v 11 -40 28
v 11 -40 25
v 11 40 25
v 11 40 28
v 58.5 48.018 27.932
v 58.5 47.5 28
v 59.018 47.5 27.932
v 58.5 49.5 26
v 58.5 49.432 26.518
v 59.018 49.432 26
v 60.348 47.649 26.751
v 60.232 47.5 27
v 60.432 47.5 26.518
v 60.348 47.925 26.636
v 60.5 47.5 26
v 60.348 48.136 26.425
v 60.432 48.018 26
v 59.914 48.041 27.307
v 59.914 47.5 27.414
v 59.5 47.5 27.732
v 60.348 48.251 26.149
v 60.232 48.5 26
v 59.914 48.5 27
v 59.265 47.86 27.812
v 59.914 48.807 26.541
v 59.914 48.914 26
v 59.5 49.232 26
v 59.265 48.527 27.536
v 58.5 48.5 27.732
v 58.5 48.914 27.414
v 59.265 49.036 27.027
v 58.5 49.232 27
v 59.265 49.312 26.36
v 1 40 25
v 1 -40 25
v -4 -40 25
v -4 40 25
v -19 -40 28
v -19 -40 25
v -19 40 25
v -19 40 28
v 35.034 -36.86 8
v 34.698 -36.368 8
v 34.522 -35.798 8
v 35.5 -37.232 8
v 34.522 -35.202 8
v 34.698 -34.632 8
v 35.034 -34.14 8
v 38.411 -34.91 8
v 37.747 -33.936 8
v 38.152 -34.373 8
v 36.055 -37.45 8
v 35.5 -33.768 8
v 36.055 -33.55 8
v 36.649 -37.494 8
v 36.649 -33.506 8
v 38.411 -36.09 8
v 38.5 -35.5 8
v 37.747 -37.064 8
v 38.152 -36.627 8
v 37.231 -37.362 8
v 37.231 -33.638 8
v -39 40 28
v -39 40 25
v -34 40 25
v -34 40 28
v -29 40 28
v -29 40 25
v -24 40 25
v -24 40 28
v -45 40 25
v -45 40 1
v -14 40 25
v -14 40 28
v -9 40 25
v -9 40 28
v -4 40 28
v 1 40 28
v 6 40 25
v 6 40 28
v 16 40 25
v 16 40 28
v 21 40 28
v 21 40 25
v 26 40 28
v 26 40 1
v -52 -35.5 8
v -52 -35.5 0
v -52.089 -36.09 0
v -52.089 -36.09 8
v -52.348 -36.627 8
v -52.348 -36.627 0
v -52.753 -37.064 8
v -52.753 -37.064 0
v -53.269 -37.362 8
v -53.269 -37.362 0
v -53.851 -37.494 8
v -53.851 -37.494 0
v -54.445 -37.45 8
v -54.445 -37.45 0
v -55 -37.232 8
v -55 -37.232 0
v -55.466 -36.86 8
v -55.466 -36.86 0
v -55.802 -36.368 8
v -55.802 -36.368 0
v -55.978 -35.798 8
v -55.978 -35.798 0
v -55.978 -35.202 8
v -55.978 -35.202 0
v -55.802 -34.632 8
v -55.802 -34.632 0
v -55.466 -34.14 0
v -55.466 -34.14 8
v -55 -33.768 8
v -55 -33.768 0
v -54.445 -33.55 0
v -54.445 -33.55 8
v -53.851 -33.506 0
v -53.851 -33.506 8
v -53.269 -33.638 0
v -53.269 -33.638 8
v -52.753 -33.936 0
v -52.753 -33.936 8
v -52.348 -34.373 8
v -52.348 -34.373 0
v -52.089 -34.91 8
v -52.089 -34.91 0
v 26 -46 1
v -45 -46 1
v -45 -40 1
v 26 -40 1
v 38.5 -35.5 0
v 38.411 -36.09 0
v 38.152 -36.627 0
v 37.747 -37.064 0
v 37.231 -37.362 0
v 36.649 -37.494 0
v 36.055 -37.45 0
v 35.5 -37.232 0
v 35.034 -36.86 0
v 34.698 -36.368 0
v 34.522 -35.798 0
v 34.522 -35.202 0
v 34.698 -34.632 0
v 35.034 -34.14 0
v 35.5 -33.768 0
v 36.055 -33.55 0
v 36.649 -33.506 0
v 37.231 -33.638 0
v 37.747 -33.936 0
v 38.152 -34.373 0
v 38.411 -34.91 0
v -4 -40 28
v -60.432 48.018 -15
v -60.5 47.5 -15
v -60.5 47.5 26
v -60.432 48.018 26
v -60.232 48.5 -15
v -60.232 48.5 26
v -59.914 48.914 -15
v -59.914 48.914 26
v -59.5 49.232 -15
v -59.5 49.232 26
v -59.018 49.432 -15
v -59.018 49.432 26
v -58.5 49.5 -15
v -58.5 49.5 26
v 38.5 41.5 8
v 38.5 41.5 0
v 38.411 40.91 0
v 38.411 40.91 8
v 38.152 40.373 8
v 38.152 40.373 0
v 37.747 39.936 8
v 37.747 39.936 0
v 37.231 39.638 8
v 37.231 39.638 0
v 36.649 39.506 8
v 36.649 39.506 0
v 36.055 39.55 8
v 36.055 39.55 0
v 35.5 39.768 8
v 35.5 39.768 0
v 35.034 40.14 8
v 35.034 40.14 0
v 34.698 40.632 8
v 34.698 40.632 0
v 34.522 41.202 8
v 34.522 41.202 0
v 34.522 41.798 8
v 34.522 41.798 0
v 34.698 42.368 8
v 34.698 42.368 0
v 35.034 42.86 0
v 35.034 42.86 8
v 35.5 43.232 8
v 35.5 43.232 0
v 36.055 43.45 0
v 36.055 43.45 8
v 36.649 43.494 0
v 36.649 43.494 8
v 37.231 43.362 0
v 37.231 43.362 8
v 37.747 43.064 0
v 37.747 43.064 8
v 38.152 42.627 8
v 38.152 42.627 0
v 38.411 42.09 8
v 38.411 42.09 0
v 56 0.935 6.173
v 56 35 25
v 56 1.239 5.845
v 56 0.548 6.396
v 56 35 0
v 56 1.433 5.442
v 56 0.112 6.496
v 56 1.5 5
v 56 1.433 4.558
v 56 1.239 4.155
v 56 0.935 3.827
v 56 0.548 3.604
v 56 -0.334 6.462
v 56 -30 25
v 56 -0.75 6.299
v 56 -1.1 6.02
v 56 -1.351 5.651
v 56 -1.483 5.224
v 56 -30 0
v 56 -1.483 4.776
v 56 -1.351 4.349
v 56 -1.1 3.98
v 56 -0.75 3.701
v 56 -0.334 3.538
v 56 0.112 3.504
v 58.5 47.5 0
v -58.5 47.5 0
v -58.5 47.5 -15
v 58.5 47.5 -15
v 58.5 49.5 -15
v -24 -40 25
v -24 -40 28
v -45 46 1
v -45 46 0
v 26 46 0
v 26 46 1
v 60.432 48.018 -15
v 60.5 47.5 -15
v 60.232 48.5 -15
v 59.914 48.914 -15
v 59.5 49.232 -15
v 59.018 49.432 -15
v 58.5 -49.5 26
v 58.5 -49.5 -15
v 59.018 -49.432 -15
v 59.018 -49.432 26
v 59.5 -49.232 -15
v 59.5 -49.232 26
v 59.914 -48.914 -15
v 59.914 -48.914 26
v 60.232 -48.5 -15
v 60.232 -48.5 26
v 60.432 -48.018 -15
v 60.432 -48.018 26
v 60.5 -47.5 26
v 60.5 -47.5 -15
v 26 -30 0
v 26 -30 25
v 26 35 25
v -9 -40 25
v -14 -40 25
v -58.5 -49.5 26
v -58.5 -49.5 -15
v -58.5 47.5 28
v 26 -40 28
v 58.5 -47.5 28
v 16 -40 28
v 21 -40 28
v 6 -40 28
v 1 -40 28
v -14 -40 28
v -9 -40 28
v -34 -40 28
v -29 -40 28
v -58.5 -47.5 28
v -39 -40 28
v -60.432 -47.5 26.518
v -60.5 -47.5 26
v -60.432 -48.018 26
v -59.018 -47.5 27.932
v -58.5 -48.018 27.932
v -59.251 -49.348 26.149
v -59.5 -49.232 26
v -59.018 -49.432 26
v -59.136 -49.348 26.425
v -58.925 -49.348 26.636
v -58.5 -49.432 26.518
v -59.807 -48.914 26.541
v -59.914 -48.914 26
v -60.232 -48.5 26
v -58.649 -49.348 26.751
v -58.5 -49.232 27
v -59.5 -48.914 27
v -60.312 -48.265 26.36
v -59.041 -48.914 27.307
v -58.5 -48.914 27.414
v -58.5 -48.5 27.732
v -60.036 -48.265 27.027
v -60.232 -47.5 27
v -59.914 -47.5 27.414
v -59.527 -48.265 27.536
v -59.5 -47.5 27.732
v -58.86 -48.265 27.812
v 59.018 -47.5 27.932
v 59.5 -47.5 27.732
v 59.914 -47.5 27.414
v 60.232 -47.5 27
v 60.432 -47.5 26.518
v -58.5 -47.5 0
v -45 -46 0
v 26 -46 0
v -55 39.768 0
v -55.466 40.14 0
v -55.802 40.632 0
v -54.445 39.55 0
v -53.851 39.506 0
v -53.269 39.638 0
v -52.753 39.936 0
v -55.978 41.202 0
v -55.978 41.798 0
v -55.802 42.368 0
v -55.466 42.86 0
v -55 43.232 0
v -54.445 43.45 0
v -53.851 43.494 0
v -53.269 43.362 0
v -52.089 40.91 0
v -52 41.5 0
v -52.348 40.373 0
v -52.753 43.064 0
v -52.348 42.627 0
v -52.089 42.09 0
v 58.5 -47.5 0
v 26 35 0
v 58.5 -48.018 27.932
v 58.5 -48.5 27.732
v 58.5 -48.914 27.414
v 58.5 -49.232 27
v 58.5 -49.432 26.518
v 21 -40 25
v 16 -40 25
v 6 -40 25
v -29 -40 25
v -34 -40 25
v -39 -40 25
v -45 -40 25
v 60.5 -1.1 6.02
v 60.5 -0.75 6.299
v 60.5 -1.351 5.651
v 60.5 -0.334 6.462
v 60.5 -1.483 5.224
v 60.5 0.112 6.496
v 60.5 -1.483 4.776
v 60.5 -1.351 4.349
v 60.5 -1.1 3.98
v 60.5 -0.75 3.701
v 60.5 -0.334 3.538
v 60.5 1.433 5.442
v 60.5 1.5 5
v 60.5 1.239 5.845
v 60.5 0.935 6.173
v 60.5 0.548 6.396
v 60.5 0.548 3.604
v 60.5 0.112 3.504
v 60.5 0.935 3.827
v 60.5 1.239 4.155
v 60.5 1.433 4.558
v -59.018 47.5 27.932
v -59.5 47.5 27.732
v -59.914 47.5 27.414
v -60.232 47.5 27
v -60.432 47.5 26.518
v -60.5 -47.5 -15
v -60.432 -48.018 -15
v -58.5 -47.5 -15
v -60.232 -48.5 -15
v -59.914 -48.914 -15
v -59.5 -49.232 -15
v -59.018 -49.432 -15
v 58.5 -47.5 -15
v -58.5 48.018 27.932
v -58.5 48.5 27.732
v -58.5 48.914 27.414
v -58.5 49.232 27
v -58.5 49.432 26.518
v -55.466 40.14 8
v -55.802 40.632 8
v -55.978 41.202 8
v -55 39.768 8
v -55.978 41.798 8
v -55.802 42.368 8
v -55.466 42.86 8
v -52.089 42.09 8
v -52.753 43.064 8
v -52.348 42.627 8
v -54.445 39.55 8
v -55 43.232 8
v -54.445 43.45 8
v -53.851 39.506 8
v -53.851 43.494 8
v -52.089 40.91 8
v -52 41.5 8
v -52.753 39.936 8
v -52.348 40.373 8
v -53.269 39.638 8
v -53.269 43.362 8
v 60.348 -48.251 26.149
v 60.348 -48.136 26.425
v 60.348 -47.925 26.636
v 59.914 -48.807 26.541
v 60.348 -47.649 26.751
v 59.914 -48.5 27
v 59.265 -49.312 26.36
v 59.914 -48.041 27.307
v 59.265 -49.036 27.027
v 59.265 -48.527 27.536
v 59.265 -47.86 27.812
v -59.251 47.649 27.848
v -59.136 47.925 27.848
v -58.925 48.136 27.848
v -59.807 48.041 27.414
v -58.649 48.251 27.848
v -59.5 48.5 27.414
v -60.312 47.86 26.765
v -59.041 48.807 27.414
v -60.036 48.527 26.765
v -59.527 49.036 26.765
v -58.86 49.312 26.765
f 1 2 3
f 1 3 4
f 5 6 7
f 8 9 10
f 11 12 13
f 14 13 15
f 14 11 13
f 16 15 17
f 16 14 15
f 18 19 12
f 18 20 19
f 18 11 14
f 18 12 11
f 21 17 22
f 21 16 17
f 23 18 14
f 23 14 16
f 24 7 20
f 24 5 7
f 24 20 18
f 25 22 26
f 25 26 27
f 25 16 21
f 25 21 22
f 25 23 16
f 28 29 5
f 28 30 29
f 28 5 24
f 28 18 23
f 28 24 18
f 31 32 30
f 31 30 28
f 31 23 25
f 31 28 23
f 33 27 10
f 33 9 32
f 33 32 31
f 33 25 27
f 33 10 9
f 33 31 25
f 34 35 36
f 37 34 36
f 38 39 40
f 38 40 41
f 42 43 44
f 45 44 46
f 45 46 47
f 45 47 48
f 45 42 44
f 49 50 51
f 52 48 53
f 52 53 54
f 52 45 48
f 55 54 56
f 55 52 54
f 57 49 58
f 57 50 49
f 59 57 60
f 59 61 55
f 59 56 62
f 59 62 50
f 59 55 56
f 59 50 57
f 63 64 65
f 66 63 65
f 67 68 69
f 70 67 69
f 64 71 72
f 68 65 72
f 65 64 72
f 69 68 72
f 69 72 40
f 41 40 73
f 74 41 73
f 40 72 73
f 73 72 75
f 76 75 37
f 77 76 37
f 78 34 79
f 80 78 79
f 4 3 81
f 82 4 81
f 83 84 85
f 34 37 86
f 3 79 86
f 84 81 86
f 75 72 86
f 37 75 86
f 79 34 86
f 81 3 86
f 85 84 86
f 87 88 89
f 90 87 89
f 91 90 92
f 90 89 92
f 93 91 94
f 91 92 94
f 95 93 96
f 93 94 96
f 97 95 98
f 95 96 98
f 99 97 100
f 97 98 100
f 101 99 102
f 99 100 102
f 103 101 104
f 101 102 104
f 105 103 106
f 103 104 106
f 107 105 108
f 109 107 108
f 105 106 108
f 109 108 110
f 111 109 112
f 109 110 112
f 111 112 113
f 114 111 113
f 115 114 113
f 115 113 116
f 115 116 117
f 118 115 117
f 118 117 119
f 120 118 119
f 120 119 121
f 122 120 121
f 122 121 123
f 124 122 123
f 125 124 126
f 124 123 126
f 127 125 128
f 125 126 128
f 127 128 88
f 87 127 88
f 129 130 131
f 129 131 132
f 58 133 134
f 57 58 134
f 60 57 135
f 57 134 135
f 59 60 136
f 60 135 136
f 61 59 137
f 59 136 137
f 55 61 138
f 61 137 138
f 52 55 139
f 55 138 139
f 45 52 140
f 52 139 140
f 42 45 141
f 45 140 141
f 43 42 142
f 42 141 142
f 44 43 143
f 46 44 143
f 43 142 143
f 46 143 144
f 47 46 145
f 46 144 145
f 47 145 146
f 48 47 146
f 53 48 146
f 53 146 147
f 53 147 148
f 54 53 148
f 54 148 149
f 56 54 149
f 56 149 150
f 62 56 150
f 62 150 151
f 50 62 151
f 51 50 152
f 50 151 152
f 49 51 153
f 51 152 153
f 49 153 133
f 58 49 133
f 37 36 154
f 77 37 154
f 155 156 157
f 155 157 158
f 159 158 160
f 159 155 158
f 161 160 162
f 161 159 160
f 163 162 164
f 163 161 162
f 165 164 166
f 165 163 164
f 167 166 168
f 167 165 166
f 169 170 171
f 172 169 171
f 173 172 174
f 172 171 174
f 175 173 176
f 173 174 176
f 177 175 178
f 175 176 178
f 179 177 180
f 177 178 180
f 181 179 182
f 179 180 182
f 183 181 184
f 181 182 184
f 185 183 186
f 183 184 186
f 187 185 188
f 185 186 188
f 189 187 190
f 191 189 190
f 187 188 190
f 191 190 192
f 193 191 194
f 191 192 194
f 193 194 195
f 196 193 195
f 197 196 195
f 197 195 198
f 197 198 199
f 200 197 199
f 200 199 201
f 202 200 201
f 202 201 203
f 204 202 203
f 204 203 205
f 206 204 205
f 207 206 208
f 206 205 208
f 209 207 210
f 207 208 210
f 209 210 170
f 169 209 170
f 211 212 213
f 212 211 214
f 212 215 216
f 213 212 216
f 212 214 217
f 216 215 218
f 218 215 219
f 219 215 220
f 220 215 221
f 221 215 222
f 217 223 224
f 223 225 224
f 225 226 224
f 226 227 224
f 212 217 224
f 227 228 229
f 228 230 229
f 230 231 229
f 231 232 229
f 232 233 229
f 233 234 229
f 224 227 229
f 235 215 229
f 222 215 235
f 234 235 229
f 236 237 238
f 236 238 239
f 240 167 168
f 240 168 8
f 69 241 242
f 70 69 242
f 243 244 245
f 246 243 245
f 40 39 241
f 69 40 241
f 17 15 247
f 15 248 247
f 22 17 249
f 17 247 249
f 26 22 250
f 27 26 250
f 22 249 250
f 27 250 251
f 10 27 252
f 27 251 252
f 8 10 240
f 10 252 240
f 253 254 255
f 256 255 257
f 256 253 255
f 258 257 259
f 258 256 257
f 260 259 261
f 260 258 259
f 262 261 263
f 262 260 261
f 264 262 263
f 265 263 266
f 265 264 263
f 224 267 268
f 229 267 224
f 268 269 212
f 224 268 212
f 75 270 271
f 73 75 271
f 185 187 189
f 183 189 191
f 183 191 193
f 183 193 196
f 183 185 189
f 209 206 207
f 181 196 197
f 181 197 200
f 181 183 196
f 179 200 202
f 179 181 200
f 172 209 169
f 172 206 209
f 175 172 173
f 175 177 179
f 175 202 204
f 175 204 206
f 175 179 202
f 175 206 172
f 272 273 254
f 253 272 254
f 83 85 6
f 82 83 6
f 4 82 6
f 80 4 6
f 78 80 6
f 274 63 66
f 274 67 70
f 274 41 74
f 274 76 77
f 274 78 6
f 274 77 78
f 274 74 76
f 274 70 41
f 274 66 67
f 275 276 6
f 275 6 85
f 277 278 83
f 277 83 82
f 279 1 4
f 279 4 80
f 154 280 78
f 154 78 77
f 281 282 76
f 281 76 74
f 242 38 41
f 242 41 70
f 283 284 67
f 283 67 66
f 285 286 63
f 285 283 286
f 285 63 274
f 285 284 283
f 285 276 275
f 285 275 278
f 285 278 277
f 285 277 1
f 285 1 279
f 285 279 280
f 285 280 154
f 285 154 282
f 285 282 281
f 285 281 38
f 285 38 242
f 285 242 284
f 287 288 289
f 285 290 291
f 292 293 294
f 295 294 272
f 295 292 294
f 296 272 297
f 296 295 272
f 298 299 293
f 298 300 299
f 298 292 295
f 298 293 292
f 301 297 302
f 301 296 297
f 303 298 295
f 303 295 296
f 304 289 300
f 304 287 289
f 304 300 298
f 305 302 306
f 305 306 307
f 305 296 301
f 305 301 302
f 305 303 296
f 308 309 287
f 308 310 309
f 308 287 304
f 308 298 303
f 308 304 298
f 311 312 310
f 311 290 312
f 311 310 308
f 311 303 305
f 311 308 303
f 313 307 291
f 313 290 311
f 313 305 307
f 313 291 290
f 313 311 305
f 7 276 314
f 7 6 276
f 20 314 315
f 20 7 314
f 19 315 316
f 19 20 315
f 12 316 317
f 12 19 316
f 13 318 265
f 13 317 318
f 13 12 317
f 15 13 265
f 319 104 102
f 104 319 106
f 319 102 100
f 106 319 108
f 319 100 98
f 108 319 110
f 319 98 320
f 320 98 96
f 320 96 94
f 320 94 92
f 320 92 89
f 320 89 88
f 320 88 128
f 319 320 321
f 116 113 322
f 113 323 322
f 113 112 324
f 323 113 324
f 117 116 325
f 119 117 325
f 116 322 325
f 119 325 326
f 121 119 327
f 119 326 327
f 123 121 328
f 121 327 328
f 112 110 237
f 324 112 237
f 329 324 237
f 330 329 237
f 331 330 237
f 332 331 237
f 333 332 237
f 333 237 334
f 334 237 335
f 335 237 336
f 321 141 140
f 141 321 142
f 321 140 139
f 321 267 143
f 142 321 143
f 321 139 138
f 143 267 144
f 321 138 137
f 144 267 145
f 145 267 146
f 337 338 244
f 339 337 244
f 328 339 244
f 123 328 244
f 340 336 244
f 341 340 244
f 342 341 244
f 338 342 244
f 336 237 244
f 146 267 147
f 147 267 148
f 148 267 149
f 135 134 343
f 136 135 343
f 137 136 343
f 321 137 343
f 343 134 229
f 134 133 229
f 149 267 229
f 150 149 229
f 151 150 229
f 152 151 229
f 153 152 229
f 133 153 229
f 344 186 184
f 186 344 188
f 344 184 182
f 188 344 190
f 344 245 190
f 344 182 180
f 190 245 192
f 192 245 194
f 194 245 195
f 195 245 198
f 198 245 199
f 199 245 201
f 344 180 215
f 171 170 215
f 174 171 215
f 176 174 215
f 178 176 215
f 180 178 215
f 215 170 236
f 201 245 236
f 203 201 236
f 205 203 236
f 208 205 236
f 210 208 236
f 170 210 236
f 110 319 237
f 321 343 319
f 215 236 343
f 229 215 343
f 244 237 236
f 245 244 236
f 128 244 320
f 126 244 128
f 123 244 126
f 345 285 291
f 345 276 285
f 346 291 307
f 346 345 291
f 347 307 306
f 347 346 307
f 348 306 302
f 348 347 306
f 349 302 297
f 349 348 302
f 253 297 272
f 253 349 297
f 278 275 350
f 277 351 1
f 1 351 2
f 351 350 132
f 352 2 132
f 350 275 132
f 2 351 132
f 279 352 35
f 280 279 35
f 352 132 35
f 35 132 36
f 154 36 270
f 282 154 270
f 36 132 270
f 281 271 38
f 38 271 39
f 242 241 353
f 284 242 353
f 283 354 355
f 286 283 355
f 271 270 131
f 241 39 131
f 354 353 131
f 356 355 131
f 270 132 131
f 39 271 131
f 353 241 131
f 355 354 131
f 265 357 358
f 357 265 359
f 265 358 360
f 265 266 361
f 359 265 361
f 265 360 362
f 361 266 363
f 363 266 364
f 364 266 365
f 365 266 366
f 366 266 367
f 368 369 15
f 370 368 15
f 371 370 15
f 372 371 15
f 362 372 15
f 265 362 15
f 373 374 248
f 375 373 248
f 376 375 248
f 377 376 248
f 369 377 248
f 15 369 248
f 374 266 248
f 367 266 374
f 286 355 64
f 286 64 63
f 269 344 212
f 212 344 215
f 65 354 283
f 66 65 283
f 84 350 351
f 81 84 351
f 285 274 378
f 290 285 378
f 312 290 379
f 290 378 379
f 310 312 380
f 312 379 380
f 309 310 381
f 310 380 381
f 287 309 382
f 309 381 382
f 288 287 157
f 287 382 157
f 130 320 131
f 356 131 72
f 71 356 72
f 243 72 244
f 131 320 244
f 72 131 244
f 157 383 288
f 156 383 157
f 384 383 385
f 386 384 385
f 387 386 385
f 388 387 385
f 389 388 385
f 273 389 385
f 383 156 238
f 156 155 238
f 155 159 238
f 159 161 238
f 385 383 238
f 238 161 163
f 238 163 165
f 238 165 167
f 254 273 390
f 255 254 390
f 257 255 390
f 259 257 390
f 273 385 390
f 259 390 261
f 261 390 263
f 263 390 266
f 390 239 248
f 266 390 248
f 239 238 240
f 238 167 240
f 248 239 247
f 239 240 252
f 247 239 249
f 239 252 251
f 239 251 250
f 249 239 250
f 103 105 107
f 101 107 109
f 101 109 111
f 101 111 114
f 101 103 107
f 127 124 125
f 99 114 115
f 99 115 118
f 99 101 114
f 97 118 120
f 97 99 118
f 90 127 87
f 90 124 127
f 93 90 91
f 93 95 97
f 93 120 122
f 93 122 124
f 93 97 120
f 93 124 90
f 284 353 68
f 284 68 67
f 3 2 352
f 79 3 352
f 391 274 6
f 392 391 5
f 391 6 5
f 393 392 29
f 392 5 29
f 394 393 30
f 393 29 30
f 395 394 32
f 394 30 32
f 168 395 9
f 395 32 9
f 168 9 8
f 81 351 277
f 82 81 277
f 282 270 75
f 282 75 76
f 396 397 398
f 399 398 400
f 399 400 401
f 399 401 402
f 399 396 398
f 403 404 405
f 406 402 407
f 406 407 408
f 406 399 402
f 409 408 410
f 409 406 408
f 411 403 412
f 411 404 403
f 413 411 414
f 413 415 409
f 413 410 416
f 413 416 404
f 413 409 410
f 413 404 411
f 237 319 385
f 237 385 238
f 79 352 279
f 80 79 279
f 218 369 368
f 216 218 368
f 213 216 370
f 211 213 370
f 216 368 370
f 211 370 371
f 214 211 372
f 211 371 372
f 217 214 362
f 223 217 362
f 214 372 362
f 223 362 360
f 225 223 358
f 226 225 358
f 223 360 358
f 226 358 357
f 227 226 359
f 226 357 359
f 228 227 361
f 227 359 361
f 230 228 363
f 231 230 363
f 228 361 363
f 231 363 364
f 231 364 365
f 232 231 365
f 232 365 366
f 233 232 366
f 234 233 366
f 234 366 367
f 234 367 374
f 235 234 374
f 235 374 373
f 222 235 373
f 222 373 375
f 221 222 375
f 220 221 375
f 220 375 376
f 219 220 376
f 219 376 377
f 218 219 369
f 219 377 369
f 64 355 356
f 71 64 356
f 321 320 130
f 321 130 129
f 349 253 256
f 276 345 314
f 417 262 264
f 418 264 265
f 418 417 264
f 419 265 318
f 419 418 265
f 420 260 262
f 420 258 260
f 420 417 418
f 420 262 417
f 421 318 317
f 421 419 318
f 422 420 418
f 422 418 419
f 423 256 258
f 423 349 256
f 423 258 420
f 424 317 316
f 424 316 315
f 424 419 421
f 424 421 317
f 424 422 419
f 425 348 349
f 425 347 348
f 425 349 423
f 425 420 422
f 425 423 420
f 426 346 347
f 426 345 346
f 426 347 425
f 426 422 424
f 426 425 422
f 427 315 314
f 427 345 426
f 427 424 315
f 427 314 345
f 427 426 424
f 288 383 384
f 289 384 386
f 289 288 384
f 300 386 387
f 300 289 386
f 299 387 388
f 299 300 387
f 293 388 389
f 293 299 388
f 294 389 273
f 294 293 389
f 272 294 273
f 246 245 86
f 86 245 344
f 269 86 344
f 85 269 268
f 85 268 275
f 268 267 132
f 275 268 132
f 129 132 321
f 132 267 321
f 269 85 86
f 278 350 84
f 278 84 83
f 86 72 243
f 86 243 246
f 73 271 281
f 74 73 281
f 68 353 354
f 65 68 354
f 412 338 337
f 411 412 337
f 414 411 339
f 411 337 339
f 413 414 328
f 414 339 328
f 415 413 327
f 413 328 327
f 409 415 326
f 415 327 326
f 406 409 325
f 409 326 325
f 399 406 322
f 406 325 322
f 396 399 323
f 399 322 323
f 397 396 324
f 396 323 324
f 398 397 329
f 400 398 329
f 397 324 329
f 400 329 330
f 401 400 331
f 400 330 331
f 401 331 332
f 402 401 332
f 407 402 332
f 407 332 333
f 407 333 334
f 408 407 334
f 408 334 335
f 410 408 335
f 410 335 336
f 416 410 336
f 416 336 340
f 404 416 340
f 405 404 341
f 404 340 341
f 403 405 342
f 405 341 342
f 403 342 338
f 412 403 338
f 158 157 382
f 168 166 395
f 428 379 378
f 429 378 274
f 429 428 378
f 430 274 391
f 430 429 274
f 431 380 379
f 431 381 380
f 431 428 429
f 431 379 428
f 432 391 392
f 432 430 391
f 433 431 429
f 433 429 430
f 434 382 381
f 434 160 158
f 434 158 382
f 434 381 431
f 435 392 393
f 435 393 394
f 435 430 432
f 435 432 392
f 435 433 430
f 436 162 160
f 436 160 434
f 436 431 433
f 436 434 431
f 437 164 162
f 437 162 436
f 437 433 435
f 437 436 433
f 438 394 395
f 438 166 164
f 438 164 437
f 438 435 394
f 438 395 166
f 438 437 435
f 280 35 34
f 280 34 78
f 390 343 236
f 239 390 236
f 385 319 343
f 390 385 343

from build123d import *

# Parameters (mm, degrees)
F0_W      = 121
F0_H      = 99
F0_W_2    = 117
F0_H_2    = 95
F1_DEPTH  = 15
F2_W      = 121
F2_H      = 99
F3_DEPTH  = 28
F4_R      = 2
F5_DEPTH  = 8
F6_W      = 6
F6_H      = 3
F6_W_2    = 5
F7_DEPTH  = 80
F8_W      = 71
F8_H      = 6
F9_DEPTH  = 1
F10_W     = 30
F10_H     = 65
F11_DEPTH = 25
F12_R     = 2
F13_R     = 1.5
F14_DEPTH = 4.5


with BuildPart() as f1:
    # F0 (on Top) → F1 (new body)
    with BuildSketch(Plane.XY):
        Rectangle(F0_W, F0_H)
        Rectangle(F0_W_2, F0_H_2, mode=Mode.SUBTRACT)
    extrude(amount=-F1_DEPTH)

    # F2 (on face) → F3 (join)
    with BuildSketch(Plane.XY):
        Rectangle(F2_W, F2_H)
        Polygon((-35, 40), (26, 40), (26, -40), (-35, -40), (-45, -40), (-45, 40), align=None, mode=Mode.SUBTRACT)
    extrude(amount=F3_DEPTH)

    # F4 (on face) → F5 (cut)
    with BuildSketch(Plane(origin=(0, 0, 0), x_dir=(1, 0, 0), z_dir=(0, 0, -1))):
        with Locations((-54, 35.5)):
            Circle(F4_R)
        with Locations((-54, -41.5)):
            Circle(F4_R)
        with Locations((36.5, 35.5)):
            Circle(F4_R)
        with Locations((36.5, -41.5)):
            Circle(F4_R)
    extrude(amount=-F5_DEPTH, mode=Mode.SUBTRACT)

    # F6 (on face) → F7 (join, through all)
    with BuildSketch(Plane(origin=(0, -40, 0), x_dir=(-1, 0, 0), z_dir=(0, 1, 0))):
        with Locations((42, 26.5)):
            Rectangle(F6_W, F6_H)
        with Locations((31.5, 26.5)):
            Rectangle(F6_W_2, F6_H)
        with Locations((21.5, 26.5)):
            Rectangle(F6_W_2, F6_H)
        with Locations((11.5, 26.5)):
            Rectangle(F6_W_2, F6_H)
        with Locations((1.5, 26.5)):
            Rectangle(F6_W_2, F6_H)
        with Locations((-8.5, 26.5)):
            Rectangle(F6_W_2, F6_H)
        with Locations((-18.5, 26.5)):
            Rectangle(F6_W_2, F6_H)
    extrude(amount=F7_DEPTH)

    # F8 (on face) → F9 (cut)
    with BuildSketch(Plane(origin=(0, 0, 0), x_dir=(1, 0, 0), z_dir=(0, 0, -1))):
        with Locations((-9.5, 43)):
            Rectangle(F8_W, F8_H)
        with Locations((-9.5, -43)):
            Rectangle(F8_W, F8_H)
    extrude(amount=-F9_DEPTH, mode=Mode.SUBTRACT)

    # F10 (on face) → F11 (cut)
    with BuildSketch(Plane(origin=(0, 0, 0), x_dir=(1, 0, 0), z_dir=(0, 0, -1))):
        with Locations((41, -2.5)):
            Rectangle(F10_W, F10_H)
    extrude(amount=-F11_DEPTH, mode=Mode.SUBTRACT)

    # F12
    f12_edges = [f1.edges().sort_by_distance(p)[0] for p in [
        (-60.5, 49.5, 6.5),
        (-60.5, 0, 28),
        (0, 49.5, 28),
        (-60.5, -49.5, 6.5),
        (0, -49.5, 28),
        (60.5, -49.5, 6.5),
        (60.5, 0, 28),
        (60.5, 49.5, 6.5),
    ]]
    fillet(f12_edges, radius=F12_R)

    # F13 (on face) → F14 (cut, through all)
    with BuildSketch(Plane.YZ.offset(60.5)):
        with Locations((0, 5)):
            Circle(F13_R)
    extrude(amount=-F14_DEPTH, mode=Mode.SUBTRACT)


solid = f1.part
